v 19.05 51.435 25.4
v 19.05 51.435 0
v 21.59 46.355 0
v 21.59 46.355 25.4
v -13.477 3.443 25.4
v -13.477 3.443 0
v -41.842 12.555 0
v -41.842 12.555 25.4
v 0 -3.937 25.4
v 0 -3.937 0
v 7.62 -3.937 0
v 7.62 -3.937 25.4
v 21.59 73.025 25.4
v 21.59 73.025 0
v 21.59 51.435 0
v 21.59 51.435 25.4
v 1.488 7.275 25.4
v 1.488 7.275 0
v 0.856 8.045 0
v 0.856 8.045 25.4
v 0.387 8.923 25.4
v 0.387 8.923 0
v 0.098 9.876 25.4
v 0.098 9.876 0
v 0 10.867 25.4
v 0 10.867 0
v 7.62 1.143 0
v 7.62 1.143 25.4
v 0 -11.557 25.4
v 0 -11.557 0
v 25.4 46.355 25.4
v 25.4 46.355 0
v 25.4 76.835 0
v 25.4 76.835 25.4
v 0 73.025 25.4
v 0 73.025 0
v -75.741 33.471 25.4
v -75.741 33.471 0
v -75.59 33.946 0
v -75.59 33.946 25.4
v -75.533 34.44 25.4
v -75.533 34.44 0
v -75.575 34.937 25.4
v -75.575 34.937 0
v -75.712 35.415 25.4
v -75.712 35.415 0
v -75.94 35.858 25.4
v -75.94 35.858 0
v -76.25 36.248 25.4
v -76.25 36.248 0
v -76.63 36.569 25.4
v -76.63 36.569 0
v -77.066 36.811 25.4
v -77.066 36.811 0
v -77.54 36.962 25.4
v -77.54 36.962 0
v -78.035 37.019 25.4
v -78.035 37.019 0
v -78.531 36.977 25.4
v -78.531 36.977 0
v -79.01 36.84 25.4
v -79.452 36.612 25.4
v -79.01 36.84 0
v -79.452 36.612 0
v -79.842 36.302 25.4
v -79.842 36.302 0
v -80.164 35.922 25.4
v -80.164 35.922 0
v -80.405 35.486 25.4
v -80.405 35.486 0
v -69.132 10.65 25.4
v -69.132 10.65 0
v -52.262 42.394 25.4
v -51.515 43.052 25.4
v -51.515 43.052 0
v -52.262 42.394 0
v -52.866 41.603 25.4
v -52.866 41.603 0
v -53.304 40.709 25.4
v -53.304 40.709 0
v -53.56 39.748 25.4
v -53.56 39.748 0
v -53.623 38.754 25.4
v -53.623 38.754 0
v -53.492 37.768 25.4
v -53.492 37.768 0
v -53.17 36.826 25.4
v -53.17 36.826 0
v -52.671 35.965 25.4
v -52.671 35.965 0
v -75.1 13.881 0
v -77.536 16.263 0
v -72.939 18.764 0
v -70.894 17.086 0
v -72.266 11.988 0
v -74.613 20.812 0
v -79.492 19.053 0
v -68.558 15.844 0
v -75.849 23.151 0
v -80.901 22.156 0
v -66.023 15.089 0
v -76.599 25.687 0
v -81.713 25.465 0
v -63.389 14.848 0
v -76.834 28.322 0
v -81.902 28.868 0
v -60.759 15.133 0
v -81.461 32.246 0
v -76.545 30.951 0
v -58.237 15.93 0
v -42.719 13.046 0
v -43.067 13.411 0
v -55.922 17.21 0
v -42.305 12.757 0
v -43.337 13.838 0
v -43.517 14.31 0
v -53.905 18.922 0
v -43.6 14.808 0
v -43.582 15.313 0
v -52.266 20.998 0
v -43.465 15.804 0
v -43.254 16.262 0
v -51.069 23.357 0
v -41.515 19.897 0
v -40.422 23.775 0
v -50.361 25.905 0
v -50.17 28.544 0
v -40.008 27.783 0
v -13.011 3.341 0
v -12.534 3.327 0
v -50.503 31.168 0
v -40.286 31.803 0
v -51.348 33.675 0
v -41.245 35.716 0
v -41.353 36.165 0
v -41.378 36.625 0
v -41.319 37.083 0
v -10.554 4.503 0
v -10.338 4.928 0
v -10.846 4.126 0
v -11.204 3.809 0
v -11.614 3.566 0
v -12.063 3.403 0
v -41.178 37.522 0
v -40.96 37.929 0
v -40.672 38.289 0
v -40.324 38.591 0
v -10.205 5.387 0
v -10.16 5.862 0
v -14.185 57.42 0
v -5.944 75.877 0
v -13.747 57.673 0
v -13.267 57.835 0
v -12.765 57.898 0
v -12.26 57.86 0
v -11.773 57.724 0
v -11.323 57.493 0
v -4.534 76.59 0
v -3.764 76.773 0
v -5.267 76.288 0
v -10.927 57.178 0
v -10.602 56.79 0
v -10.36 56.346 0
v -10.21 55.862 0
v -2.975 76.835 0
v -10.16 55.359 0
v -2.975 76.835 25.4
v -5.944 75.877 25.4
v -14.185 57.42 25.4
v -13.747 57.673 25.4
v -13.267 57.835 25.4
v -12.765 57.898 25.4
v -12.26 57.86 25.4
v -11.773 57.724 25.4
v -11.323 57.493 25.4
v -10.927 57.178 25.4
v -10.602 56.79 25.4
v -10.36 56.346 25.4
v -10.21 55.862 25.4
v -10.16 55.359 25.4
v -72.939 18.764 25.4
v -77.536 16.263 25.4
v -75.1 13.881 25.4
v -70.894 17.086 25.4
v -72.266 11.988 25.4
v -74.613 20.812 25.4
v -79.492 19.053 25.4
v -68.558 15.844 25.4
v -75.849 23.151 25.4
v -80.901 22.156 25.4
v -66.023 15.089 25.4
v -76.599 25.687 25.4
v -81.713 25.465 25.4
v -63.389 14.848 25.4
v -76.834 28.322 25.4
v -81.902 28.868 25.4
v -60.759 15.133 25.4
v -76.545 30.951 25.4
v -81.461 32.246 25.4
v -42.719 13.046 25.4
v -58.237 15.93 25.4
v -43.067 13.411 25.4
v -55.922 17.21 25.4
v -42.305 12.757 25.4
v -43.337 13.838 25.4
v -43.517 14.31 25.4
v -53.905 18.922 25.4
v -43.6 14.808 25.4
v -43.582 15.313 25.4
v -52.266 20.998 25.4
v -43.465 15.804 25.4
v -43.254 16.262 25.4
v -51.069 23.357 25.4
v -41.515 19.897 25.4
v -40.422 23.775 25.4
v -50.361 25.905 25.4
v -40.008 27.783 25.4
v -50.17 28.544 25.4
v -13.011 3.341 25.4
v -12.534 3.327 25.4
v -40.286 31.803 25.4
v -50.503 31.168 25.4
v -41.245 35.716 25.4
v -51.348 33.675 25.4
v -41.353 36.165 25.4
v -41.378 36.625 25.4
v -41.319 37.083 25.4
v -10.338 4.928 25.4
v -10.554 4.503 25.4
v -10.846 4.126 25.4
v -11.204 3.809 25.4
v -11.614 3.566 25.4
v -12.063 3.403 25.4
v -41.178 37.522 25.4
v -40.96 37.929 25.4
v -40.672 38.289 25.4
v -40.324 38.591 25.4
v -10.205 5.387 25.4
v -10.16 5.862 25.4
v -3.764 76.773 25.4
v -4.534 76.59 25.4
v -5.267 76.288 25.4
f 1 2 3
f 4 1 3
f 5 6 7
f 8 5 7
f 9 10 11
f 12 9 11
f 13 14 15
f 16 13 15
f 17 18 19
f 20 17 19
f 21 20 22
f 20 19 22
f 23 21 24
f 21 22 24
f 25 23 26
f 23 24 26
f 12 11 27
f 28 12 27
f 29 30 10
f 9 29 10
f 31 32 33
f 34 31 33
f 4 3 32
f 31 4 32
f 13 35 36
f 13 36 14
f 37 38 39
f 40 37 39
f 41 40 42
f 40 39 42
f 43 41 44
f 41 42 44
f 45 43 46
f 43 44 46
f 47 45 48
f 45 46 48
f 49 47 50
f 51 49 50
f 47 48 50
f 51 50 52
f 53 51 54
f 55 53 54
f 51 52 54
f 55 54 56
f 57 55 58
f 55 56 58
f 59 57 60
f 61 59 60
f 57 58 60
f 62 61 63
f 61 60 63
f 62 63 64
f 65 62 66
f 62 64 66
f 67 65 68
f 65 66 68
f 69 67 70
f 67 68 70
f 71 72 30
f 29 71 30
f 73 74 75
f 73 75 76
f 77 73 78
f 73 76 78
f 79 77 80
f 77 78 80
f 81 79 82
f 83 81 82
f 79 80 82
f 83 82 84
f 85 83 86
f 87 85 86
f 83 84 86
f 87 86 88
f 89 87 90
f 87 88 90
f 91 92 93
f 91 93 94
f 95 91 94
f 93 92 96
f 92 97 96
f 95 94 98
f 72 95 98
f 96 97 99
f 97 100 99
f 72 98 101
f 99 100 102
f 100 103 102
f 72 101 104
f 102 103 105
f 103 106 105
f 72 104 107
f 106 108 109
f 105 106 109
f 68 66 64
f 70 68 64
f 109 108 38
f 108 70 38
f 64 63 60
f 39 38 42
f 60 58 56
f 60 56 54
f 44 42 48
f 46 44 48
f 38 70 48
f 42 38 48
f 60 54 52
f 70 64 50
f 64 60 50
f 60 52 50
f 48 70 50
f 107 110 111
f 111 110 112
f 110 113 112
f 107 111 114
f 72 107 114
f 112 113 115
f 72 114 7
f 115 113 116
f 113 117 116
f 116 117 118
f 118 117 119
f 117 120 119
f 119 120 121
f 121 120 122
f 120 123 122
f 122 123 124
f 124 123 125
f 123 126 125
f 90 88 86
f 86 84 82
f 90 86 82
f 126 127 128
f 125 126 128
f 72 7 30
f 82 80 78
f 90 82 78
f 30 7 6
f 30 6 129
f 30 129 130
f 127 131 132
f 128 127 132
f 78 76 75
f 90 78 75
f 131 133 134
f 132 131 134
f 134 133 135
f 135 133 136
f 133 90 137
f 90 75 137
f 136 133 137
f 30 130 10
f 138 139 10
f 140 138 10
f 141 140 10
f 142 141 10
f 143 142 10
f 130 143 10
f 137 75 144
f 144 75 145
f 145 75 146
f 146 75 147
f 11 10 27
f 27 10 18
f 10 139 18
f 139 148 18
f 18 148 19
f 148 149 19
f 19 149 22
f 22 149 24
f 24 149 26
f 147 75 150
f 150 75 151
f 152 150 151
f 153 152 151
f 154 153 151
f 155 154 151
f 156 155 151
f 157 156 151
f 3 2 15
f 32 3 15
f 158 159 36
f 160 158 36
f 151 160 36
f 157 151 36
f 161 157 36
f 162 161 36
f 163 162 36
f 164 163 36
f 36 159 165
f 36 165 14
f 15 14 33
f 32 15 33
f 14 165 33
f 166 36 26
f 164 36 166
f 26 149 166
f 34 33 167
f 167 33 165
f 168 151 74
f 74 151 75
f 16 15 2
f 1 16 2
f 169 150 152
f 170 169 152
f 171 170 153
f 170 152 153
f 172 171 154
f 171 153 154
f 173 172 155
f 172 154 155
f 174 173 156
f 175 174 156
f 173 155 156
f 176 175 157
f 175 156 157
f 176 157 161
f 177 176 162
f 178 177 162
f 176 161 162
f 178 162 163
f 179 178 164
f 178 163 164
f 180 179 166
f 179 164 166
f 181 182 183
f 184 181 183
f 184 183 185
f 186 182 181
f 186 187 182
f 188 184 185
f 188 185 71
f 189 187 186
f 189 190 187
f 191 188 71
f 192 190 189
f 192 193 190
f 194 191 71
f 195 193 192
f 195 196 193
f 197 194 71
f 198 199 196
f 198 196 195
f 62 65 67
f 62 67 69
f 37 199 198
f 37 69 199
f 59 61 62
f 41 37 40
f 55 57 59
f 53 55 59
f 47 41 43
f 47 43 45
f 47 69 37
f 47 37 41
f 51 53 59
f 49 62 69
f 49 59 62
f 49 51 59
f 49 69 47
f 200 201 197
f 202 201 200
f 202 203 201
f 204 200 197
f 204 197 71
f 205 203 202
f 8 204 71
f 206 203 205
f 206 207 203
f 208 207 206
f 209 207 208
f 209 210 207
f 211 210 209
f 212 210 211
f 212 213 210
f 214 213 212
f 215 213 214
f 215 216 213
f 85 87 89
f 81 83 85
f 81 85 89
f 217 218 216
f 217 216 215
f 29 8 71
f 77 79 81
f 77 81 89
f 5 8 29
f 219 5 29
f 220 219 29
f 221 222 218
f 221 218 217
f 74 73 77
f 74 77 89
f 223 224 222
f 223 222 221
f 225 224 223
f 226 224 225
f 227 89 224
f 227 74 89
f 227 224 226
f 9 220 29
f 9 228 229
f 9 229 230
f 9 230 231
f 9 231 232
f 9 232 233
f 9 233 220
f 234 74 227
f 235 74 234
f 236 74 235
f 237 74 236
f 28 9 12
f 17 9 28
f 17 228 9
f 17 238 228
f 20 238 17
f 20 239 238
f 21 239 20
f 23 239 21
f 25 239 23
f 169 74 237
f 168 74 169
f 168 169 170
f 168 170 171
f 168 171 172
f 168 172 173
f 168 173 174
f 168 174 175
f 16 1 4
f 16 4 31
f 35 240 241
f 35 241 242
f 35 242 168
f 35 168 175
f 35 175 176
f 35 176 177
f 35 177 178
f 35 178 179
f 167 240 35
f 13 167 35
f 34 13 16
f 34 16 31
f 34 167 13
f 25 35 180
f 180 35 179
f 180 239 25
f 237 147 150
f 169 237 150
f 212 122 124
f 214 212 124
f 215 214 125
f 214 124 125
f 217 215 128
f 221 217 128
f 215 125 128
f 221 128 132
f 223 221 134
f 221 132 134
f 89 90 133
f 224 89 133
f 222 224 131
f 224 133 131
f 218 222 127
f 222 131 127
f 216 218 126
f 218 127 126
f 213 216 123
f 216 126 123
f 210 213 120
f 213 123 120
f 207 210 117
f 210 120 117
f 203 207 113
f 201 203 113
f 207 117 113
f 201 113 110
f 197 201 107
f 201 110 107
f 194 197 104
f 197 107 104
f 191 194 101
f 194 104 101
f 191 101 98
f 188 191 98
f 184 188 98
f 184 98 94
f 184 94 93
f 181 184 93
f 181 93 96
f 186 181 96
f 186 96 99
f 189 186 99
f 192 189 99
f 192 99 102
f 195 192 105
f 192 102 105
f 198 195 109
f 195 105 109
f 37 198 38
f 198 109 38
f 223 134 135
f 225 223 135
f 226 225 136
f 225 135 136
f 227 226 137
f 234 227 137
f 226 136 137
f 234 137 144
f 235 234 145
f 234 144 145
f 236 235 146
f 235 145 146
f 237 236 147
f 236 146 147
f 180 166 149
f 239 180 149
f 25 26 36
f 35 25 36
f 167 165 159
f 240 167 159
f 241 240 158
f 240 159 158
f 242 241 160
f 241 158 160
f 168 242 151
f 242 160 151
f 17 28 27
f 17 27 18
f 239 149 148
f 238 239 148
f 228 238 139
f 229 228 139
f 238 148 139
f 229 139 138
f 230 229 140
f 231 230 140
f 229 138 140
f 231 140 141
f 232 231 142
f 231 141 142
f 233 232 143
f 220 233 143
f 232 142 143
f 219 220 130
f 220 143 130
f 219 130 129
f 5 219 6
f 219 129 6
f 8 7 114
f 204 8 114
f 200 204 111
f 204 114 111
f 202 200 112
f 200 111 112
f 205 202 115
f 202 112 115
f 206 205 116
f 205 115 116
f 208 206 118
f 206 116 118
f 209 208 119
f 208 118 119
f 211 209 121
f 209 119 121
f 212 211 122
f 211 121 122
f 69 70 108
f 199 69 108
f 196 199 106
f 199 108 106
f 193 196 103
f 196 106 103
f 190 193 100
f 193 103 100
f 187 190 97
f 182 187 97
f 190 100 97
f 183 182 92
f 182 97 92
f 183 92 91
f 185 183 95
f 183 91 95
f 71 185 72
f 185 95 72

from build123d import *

# Parameters (mm, degrees)
F1_DEPTH = 25.4


with BuildPart() as f1:
    # F0 (on Top) → F1 (new body)
    with BuildSketch(Plane.XY):
        with BuildLine():
            Line((0, 10.867205), (0, 73.025))
            Line((0, 73.025), (21.59, 73.025))
            Line((21.59, 73.025), (21.59, 51.435))
            Line((21.59, 51.435), (19.05, 51.435))
            Line((19.05, 51.435), (21.59, 46.355))
            Line((21.59, 46.355), (25.4, 46.355))
            Line((25.4, 46.355), (25.4, 76.835))
            Line((25.4, 76.835), (-2.974549, 76.835))
            ThreePointArc((-2.974549, 76.835), (-4.534456, 76.589572), (-5.943638, 75.877004))
            Line((-5.943638, 75.877004), (-51.515202, 43.051709))
            ThreePointArc((-51.515202, 43.051709), (-53.559832, 39.747649), (-52.671324, 35.965073))
            ThreePointArc((-52.671324, 35.965073), (-62.067004, 14.925134), (-75.741455, 33.471487))
            ThreePointArc((-75.741455, 33.471487), (-77.065813, 36.81054), (-80.404866, 35.486182))
            ThreePointArc((-80.404866, 35.486182), (-80.268512, 20.571789), (-69.132008, 10.650296))
            Line((-69.132008, 10.650296), (0, -11.557))
            Line((0, -11.557), (0, -3.937))
            Line((0, -3.937), (7.62, -3.937))
            Line((7.62, -3.937), (7.62, 1.143))
            Line((7.62, 1.143), (1.487898, 7.275102))
            ThreePointArc((1.487898, 7.275102), (0.386692, 8.923173), (0, 10.867205))
        make_face()
        with BuildLine():
            ThreePointArc((-14.184544, 57.419772), (-11.542231, 57.61956), (-10.16, 55.358771))
            Line((-10.16, 55.358771), (-10.16, 5.86179))
            ThreePointArc((-10.16, 5.86179), (-11.203595, 3.809384), (-13.476829, 3.443498))
            Line((-13.476829, 3.443498), (-41.841771, 12.555177))
            ThreePointArc((-41.841771, 12.555177), (-43.438593, 14.069376), (-43.253729, 16.262196))
            ThreePointArc((-43.253729, 16.262196), (-40.129208, 25.770222), (-41.245404, 35.71604))
            ThreePointArc((-41.245404, 35.71604), (-41.258358, 37.305502), (-40.324046, 38.591434))
            Line((-40.324046, 38.591434), (-14.184544, 57.419772))
        make_face(mode=Mode.SUBTRACT)
    extrude(amount=F1_DEPTH)


solid = f1.part
